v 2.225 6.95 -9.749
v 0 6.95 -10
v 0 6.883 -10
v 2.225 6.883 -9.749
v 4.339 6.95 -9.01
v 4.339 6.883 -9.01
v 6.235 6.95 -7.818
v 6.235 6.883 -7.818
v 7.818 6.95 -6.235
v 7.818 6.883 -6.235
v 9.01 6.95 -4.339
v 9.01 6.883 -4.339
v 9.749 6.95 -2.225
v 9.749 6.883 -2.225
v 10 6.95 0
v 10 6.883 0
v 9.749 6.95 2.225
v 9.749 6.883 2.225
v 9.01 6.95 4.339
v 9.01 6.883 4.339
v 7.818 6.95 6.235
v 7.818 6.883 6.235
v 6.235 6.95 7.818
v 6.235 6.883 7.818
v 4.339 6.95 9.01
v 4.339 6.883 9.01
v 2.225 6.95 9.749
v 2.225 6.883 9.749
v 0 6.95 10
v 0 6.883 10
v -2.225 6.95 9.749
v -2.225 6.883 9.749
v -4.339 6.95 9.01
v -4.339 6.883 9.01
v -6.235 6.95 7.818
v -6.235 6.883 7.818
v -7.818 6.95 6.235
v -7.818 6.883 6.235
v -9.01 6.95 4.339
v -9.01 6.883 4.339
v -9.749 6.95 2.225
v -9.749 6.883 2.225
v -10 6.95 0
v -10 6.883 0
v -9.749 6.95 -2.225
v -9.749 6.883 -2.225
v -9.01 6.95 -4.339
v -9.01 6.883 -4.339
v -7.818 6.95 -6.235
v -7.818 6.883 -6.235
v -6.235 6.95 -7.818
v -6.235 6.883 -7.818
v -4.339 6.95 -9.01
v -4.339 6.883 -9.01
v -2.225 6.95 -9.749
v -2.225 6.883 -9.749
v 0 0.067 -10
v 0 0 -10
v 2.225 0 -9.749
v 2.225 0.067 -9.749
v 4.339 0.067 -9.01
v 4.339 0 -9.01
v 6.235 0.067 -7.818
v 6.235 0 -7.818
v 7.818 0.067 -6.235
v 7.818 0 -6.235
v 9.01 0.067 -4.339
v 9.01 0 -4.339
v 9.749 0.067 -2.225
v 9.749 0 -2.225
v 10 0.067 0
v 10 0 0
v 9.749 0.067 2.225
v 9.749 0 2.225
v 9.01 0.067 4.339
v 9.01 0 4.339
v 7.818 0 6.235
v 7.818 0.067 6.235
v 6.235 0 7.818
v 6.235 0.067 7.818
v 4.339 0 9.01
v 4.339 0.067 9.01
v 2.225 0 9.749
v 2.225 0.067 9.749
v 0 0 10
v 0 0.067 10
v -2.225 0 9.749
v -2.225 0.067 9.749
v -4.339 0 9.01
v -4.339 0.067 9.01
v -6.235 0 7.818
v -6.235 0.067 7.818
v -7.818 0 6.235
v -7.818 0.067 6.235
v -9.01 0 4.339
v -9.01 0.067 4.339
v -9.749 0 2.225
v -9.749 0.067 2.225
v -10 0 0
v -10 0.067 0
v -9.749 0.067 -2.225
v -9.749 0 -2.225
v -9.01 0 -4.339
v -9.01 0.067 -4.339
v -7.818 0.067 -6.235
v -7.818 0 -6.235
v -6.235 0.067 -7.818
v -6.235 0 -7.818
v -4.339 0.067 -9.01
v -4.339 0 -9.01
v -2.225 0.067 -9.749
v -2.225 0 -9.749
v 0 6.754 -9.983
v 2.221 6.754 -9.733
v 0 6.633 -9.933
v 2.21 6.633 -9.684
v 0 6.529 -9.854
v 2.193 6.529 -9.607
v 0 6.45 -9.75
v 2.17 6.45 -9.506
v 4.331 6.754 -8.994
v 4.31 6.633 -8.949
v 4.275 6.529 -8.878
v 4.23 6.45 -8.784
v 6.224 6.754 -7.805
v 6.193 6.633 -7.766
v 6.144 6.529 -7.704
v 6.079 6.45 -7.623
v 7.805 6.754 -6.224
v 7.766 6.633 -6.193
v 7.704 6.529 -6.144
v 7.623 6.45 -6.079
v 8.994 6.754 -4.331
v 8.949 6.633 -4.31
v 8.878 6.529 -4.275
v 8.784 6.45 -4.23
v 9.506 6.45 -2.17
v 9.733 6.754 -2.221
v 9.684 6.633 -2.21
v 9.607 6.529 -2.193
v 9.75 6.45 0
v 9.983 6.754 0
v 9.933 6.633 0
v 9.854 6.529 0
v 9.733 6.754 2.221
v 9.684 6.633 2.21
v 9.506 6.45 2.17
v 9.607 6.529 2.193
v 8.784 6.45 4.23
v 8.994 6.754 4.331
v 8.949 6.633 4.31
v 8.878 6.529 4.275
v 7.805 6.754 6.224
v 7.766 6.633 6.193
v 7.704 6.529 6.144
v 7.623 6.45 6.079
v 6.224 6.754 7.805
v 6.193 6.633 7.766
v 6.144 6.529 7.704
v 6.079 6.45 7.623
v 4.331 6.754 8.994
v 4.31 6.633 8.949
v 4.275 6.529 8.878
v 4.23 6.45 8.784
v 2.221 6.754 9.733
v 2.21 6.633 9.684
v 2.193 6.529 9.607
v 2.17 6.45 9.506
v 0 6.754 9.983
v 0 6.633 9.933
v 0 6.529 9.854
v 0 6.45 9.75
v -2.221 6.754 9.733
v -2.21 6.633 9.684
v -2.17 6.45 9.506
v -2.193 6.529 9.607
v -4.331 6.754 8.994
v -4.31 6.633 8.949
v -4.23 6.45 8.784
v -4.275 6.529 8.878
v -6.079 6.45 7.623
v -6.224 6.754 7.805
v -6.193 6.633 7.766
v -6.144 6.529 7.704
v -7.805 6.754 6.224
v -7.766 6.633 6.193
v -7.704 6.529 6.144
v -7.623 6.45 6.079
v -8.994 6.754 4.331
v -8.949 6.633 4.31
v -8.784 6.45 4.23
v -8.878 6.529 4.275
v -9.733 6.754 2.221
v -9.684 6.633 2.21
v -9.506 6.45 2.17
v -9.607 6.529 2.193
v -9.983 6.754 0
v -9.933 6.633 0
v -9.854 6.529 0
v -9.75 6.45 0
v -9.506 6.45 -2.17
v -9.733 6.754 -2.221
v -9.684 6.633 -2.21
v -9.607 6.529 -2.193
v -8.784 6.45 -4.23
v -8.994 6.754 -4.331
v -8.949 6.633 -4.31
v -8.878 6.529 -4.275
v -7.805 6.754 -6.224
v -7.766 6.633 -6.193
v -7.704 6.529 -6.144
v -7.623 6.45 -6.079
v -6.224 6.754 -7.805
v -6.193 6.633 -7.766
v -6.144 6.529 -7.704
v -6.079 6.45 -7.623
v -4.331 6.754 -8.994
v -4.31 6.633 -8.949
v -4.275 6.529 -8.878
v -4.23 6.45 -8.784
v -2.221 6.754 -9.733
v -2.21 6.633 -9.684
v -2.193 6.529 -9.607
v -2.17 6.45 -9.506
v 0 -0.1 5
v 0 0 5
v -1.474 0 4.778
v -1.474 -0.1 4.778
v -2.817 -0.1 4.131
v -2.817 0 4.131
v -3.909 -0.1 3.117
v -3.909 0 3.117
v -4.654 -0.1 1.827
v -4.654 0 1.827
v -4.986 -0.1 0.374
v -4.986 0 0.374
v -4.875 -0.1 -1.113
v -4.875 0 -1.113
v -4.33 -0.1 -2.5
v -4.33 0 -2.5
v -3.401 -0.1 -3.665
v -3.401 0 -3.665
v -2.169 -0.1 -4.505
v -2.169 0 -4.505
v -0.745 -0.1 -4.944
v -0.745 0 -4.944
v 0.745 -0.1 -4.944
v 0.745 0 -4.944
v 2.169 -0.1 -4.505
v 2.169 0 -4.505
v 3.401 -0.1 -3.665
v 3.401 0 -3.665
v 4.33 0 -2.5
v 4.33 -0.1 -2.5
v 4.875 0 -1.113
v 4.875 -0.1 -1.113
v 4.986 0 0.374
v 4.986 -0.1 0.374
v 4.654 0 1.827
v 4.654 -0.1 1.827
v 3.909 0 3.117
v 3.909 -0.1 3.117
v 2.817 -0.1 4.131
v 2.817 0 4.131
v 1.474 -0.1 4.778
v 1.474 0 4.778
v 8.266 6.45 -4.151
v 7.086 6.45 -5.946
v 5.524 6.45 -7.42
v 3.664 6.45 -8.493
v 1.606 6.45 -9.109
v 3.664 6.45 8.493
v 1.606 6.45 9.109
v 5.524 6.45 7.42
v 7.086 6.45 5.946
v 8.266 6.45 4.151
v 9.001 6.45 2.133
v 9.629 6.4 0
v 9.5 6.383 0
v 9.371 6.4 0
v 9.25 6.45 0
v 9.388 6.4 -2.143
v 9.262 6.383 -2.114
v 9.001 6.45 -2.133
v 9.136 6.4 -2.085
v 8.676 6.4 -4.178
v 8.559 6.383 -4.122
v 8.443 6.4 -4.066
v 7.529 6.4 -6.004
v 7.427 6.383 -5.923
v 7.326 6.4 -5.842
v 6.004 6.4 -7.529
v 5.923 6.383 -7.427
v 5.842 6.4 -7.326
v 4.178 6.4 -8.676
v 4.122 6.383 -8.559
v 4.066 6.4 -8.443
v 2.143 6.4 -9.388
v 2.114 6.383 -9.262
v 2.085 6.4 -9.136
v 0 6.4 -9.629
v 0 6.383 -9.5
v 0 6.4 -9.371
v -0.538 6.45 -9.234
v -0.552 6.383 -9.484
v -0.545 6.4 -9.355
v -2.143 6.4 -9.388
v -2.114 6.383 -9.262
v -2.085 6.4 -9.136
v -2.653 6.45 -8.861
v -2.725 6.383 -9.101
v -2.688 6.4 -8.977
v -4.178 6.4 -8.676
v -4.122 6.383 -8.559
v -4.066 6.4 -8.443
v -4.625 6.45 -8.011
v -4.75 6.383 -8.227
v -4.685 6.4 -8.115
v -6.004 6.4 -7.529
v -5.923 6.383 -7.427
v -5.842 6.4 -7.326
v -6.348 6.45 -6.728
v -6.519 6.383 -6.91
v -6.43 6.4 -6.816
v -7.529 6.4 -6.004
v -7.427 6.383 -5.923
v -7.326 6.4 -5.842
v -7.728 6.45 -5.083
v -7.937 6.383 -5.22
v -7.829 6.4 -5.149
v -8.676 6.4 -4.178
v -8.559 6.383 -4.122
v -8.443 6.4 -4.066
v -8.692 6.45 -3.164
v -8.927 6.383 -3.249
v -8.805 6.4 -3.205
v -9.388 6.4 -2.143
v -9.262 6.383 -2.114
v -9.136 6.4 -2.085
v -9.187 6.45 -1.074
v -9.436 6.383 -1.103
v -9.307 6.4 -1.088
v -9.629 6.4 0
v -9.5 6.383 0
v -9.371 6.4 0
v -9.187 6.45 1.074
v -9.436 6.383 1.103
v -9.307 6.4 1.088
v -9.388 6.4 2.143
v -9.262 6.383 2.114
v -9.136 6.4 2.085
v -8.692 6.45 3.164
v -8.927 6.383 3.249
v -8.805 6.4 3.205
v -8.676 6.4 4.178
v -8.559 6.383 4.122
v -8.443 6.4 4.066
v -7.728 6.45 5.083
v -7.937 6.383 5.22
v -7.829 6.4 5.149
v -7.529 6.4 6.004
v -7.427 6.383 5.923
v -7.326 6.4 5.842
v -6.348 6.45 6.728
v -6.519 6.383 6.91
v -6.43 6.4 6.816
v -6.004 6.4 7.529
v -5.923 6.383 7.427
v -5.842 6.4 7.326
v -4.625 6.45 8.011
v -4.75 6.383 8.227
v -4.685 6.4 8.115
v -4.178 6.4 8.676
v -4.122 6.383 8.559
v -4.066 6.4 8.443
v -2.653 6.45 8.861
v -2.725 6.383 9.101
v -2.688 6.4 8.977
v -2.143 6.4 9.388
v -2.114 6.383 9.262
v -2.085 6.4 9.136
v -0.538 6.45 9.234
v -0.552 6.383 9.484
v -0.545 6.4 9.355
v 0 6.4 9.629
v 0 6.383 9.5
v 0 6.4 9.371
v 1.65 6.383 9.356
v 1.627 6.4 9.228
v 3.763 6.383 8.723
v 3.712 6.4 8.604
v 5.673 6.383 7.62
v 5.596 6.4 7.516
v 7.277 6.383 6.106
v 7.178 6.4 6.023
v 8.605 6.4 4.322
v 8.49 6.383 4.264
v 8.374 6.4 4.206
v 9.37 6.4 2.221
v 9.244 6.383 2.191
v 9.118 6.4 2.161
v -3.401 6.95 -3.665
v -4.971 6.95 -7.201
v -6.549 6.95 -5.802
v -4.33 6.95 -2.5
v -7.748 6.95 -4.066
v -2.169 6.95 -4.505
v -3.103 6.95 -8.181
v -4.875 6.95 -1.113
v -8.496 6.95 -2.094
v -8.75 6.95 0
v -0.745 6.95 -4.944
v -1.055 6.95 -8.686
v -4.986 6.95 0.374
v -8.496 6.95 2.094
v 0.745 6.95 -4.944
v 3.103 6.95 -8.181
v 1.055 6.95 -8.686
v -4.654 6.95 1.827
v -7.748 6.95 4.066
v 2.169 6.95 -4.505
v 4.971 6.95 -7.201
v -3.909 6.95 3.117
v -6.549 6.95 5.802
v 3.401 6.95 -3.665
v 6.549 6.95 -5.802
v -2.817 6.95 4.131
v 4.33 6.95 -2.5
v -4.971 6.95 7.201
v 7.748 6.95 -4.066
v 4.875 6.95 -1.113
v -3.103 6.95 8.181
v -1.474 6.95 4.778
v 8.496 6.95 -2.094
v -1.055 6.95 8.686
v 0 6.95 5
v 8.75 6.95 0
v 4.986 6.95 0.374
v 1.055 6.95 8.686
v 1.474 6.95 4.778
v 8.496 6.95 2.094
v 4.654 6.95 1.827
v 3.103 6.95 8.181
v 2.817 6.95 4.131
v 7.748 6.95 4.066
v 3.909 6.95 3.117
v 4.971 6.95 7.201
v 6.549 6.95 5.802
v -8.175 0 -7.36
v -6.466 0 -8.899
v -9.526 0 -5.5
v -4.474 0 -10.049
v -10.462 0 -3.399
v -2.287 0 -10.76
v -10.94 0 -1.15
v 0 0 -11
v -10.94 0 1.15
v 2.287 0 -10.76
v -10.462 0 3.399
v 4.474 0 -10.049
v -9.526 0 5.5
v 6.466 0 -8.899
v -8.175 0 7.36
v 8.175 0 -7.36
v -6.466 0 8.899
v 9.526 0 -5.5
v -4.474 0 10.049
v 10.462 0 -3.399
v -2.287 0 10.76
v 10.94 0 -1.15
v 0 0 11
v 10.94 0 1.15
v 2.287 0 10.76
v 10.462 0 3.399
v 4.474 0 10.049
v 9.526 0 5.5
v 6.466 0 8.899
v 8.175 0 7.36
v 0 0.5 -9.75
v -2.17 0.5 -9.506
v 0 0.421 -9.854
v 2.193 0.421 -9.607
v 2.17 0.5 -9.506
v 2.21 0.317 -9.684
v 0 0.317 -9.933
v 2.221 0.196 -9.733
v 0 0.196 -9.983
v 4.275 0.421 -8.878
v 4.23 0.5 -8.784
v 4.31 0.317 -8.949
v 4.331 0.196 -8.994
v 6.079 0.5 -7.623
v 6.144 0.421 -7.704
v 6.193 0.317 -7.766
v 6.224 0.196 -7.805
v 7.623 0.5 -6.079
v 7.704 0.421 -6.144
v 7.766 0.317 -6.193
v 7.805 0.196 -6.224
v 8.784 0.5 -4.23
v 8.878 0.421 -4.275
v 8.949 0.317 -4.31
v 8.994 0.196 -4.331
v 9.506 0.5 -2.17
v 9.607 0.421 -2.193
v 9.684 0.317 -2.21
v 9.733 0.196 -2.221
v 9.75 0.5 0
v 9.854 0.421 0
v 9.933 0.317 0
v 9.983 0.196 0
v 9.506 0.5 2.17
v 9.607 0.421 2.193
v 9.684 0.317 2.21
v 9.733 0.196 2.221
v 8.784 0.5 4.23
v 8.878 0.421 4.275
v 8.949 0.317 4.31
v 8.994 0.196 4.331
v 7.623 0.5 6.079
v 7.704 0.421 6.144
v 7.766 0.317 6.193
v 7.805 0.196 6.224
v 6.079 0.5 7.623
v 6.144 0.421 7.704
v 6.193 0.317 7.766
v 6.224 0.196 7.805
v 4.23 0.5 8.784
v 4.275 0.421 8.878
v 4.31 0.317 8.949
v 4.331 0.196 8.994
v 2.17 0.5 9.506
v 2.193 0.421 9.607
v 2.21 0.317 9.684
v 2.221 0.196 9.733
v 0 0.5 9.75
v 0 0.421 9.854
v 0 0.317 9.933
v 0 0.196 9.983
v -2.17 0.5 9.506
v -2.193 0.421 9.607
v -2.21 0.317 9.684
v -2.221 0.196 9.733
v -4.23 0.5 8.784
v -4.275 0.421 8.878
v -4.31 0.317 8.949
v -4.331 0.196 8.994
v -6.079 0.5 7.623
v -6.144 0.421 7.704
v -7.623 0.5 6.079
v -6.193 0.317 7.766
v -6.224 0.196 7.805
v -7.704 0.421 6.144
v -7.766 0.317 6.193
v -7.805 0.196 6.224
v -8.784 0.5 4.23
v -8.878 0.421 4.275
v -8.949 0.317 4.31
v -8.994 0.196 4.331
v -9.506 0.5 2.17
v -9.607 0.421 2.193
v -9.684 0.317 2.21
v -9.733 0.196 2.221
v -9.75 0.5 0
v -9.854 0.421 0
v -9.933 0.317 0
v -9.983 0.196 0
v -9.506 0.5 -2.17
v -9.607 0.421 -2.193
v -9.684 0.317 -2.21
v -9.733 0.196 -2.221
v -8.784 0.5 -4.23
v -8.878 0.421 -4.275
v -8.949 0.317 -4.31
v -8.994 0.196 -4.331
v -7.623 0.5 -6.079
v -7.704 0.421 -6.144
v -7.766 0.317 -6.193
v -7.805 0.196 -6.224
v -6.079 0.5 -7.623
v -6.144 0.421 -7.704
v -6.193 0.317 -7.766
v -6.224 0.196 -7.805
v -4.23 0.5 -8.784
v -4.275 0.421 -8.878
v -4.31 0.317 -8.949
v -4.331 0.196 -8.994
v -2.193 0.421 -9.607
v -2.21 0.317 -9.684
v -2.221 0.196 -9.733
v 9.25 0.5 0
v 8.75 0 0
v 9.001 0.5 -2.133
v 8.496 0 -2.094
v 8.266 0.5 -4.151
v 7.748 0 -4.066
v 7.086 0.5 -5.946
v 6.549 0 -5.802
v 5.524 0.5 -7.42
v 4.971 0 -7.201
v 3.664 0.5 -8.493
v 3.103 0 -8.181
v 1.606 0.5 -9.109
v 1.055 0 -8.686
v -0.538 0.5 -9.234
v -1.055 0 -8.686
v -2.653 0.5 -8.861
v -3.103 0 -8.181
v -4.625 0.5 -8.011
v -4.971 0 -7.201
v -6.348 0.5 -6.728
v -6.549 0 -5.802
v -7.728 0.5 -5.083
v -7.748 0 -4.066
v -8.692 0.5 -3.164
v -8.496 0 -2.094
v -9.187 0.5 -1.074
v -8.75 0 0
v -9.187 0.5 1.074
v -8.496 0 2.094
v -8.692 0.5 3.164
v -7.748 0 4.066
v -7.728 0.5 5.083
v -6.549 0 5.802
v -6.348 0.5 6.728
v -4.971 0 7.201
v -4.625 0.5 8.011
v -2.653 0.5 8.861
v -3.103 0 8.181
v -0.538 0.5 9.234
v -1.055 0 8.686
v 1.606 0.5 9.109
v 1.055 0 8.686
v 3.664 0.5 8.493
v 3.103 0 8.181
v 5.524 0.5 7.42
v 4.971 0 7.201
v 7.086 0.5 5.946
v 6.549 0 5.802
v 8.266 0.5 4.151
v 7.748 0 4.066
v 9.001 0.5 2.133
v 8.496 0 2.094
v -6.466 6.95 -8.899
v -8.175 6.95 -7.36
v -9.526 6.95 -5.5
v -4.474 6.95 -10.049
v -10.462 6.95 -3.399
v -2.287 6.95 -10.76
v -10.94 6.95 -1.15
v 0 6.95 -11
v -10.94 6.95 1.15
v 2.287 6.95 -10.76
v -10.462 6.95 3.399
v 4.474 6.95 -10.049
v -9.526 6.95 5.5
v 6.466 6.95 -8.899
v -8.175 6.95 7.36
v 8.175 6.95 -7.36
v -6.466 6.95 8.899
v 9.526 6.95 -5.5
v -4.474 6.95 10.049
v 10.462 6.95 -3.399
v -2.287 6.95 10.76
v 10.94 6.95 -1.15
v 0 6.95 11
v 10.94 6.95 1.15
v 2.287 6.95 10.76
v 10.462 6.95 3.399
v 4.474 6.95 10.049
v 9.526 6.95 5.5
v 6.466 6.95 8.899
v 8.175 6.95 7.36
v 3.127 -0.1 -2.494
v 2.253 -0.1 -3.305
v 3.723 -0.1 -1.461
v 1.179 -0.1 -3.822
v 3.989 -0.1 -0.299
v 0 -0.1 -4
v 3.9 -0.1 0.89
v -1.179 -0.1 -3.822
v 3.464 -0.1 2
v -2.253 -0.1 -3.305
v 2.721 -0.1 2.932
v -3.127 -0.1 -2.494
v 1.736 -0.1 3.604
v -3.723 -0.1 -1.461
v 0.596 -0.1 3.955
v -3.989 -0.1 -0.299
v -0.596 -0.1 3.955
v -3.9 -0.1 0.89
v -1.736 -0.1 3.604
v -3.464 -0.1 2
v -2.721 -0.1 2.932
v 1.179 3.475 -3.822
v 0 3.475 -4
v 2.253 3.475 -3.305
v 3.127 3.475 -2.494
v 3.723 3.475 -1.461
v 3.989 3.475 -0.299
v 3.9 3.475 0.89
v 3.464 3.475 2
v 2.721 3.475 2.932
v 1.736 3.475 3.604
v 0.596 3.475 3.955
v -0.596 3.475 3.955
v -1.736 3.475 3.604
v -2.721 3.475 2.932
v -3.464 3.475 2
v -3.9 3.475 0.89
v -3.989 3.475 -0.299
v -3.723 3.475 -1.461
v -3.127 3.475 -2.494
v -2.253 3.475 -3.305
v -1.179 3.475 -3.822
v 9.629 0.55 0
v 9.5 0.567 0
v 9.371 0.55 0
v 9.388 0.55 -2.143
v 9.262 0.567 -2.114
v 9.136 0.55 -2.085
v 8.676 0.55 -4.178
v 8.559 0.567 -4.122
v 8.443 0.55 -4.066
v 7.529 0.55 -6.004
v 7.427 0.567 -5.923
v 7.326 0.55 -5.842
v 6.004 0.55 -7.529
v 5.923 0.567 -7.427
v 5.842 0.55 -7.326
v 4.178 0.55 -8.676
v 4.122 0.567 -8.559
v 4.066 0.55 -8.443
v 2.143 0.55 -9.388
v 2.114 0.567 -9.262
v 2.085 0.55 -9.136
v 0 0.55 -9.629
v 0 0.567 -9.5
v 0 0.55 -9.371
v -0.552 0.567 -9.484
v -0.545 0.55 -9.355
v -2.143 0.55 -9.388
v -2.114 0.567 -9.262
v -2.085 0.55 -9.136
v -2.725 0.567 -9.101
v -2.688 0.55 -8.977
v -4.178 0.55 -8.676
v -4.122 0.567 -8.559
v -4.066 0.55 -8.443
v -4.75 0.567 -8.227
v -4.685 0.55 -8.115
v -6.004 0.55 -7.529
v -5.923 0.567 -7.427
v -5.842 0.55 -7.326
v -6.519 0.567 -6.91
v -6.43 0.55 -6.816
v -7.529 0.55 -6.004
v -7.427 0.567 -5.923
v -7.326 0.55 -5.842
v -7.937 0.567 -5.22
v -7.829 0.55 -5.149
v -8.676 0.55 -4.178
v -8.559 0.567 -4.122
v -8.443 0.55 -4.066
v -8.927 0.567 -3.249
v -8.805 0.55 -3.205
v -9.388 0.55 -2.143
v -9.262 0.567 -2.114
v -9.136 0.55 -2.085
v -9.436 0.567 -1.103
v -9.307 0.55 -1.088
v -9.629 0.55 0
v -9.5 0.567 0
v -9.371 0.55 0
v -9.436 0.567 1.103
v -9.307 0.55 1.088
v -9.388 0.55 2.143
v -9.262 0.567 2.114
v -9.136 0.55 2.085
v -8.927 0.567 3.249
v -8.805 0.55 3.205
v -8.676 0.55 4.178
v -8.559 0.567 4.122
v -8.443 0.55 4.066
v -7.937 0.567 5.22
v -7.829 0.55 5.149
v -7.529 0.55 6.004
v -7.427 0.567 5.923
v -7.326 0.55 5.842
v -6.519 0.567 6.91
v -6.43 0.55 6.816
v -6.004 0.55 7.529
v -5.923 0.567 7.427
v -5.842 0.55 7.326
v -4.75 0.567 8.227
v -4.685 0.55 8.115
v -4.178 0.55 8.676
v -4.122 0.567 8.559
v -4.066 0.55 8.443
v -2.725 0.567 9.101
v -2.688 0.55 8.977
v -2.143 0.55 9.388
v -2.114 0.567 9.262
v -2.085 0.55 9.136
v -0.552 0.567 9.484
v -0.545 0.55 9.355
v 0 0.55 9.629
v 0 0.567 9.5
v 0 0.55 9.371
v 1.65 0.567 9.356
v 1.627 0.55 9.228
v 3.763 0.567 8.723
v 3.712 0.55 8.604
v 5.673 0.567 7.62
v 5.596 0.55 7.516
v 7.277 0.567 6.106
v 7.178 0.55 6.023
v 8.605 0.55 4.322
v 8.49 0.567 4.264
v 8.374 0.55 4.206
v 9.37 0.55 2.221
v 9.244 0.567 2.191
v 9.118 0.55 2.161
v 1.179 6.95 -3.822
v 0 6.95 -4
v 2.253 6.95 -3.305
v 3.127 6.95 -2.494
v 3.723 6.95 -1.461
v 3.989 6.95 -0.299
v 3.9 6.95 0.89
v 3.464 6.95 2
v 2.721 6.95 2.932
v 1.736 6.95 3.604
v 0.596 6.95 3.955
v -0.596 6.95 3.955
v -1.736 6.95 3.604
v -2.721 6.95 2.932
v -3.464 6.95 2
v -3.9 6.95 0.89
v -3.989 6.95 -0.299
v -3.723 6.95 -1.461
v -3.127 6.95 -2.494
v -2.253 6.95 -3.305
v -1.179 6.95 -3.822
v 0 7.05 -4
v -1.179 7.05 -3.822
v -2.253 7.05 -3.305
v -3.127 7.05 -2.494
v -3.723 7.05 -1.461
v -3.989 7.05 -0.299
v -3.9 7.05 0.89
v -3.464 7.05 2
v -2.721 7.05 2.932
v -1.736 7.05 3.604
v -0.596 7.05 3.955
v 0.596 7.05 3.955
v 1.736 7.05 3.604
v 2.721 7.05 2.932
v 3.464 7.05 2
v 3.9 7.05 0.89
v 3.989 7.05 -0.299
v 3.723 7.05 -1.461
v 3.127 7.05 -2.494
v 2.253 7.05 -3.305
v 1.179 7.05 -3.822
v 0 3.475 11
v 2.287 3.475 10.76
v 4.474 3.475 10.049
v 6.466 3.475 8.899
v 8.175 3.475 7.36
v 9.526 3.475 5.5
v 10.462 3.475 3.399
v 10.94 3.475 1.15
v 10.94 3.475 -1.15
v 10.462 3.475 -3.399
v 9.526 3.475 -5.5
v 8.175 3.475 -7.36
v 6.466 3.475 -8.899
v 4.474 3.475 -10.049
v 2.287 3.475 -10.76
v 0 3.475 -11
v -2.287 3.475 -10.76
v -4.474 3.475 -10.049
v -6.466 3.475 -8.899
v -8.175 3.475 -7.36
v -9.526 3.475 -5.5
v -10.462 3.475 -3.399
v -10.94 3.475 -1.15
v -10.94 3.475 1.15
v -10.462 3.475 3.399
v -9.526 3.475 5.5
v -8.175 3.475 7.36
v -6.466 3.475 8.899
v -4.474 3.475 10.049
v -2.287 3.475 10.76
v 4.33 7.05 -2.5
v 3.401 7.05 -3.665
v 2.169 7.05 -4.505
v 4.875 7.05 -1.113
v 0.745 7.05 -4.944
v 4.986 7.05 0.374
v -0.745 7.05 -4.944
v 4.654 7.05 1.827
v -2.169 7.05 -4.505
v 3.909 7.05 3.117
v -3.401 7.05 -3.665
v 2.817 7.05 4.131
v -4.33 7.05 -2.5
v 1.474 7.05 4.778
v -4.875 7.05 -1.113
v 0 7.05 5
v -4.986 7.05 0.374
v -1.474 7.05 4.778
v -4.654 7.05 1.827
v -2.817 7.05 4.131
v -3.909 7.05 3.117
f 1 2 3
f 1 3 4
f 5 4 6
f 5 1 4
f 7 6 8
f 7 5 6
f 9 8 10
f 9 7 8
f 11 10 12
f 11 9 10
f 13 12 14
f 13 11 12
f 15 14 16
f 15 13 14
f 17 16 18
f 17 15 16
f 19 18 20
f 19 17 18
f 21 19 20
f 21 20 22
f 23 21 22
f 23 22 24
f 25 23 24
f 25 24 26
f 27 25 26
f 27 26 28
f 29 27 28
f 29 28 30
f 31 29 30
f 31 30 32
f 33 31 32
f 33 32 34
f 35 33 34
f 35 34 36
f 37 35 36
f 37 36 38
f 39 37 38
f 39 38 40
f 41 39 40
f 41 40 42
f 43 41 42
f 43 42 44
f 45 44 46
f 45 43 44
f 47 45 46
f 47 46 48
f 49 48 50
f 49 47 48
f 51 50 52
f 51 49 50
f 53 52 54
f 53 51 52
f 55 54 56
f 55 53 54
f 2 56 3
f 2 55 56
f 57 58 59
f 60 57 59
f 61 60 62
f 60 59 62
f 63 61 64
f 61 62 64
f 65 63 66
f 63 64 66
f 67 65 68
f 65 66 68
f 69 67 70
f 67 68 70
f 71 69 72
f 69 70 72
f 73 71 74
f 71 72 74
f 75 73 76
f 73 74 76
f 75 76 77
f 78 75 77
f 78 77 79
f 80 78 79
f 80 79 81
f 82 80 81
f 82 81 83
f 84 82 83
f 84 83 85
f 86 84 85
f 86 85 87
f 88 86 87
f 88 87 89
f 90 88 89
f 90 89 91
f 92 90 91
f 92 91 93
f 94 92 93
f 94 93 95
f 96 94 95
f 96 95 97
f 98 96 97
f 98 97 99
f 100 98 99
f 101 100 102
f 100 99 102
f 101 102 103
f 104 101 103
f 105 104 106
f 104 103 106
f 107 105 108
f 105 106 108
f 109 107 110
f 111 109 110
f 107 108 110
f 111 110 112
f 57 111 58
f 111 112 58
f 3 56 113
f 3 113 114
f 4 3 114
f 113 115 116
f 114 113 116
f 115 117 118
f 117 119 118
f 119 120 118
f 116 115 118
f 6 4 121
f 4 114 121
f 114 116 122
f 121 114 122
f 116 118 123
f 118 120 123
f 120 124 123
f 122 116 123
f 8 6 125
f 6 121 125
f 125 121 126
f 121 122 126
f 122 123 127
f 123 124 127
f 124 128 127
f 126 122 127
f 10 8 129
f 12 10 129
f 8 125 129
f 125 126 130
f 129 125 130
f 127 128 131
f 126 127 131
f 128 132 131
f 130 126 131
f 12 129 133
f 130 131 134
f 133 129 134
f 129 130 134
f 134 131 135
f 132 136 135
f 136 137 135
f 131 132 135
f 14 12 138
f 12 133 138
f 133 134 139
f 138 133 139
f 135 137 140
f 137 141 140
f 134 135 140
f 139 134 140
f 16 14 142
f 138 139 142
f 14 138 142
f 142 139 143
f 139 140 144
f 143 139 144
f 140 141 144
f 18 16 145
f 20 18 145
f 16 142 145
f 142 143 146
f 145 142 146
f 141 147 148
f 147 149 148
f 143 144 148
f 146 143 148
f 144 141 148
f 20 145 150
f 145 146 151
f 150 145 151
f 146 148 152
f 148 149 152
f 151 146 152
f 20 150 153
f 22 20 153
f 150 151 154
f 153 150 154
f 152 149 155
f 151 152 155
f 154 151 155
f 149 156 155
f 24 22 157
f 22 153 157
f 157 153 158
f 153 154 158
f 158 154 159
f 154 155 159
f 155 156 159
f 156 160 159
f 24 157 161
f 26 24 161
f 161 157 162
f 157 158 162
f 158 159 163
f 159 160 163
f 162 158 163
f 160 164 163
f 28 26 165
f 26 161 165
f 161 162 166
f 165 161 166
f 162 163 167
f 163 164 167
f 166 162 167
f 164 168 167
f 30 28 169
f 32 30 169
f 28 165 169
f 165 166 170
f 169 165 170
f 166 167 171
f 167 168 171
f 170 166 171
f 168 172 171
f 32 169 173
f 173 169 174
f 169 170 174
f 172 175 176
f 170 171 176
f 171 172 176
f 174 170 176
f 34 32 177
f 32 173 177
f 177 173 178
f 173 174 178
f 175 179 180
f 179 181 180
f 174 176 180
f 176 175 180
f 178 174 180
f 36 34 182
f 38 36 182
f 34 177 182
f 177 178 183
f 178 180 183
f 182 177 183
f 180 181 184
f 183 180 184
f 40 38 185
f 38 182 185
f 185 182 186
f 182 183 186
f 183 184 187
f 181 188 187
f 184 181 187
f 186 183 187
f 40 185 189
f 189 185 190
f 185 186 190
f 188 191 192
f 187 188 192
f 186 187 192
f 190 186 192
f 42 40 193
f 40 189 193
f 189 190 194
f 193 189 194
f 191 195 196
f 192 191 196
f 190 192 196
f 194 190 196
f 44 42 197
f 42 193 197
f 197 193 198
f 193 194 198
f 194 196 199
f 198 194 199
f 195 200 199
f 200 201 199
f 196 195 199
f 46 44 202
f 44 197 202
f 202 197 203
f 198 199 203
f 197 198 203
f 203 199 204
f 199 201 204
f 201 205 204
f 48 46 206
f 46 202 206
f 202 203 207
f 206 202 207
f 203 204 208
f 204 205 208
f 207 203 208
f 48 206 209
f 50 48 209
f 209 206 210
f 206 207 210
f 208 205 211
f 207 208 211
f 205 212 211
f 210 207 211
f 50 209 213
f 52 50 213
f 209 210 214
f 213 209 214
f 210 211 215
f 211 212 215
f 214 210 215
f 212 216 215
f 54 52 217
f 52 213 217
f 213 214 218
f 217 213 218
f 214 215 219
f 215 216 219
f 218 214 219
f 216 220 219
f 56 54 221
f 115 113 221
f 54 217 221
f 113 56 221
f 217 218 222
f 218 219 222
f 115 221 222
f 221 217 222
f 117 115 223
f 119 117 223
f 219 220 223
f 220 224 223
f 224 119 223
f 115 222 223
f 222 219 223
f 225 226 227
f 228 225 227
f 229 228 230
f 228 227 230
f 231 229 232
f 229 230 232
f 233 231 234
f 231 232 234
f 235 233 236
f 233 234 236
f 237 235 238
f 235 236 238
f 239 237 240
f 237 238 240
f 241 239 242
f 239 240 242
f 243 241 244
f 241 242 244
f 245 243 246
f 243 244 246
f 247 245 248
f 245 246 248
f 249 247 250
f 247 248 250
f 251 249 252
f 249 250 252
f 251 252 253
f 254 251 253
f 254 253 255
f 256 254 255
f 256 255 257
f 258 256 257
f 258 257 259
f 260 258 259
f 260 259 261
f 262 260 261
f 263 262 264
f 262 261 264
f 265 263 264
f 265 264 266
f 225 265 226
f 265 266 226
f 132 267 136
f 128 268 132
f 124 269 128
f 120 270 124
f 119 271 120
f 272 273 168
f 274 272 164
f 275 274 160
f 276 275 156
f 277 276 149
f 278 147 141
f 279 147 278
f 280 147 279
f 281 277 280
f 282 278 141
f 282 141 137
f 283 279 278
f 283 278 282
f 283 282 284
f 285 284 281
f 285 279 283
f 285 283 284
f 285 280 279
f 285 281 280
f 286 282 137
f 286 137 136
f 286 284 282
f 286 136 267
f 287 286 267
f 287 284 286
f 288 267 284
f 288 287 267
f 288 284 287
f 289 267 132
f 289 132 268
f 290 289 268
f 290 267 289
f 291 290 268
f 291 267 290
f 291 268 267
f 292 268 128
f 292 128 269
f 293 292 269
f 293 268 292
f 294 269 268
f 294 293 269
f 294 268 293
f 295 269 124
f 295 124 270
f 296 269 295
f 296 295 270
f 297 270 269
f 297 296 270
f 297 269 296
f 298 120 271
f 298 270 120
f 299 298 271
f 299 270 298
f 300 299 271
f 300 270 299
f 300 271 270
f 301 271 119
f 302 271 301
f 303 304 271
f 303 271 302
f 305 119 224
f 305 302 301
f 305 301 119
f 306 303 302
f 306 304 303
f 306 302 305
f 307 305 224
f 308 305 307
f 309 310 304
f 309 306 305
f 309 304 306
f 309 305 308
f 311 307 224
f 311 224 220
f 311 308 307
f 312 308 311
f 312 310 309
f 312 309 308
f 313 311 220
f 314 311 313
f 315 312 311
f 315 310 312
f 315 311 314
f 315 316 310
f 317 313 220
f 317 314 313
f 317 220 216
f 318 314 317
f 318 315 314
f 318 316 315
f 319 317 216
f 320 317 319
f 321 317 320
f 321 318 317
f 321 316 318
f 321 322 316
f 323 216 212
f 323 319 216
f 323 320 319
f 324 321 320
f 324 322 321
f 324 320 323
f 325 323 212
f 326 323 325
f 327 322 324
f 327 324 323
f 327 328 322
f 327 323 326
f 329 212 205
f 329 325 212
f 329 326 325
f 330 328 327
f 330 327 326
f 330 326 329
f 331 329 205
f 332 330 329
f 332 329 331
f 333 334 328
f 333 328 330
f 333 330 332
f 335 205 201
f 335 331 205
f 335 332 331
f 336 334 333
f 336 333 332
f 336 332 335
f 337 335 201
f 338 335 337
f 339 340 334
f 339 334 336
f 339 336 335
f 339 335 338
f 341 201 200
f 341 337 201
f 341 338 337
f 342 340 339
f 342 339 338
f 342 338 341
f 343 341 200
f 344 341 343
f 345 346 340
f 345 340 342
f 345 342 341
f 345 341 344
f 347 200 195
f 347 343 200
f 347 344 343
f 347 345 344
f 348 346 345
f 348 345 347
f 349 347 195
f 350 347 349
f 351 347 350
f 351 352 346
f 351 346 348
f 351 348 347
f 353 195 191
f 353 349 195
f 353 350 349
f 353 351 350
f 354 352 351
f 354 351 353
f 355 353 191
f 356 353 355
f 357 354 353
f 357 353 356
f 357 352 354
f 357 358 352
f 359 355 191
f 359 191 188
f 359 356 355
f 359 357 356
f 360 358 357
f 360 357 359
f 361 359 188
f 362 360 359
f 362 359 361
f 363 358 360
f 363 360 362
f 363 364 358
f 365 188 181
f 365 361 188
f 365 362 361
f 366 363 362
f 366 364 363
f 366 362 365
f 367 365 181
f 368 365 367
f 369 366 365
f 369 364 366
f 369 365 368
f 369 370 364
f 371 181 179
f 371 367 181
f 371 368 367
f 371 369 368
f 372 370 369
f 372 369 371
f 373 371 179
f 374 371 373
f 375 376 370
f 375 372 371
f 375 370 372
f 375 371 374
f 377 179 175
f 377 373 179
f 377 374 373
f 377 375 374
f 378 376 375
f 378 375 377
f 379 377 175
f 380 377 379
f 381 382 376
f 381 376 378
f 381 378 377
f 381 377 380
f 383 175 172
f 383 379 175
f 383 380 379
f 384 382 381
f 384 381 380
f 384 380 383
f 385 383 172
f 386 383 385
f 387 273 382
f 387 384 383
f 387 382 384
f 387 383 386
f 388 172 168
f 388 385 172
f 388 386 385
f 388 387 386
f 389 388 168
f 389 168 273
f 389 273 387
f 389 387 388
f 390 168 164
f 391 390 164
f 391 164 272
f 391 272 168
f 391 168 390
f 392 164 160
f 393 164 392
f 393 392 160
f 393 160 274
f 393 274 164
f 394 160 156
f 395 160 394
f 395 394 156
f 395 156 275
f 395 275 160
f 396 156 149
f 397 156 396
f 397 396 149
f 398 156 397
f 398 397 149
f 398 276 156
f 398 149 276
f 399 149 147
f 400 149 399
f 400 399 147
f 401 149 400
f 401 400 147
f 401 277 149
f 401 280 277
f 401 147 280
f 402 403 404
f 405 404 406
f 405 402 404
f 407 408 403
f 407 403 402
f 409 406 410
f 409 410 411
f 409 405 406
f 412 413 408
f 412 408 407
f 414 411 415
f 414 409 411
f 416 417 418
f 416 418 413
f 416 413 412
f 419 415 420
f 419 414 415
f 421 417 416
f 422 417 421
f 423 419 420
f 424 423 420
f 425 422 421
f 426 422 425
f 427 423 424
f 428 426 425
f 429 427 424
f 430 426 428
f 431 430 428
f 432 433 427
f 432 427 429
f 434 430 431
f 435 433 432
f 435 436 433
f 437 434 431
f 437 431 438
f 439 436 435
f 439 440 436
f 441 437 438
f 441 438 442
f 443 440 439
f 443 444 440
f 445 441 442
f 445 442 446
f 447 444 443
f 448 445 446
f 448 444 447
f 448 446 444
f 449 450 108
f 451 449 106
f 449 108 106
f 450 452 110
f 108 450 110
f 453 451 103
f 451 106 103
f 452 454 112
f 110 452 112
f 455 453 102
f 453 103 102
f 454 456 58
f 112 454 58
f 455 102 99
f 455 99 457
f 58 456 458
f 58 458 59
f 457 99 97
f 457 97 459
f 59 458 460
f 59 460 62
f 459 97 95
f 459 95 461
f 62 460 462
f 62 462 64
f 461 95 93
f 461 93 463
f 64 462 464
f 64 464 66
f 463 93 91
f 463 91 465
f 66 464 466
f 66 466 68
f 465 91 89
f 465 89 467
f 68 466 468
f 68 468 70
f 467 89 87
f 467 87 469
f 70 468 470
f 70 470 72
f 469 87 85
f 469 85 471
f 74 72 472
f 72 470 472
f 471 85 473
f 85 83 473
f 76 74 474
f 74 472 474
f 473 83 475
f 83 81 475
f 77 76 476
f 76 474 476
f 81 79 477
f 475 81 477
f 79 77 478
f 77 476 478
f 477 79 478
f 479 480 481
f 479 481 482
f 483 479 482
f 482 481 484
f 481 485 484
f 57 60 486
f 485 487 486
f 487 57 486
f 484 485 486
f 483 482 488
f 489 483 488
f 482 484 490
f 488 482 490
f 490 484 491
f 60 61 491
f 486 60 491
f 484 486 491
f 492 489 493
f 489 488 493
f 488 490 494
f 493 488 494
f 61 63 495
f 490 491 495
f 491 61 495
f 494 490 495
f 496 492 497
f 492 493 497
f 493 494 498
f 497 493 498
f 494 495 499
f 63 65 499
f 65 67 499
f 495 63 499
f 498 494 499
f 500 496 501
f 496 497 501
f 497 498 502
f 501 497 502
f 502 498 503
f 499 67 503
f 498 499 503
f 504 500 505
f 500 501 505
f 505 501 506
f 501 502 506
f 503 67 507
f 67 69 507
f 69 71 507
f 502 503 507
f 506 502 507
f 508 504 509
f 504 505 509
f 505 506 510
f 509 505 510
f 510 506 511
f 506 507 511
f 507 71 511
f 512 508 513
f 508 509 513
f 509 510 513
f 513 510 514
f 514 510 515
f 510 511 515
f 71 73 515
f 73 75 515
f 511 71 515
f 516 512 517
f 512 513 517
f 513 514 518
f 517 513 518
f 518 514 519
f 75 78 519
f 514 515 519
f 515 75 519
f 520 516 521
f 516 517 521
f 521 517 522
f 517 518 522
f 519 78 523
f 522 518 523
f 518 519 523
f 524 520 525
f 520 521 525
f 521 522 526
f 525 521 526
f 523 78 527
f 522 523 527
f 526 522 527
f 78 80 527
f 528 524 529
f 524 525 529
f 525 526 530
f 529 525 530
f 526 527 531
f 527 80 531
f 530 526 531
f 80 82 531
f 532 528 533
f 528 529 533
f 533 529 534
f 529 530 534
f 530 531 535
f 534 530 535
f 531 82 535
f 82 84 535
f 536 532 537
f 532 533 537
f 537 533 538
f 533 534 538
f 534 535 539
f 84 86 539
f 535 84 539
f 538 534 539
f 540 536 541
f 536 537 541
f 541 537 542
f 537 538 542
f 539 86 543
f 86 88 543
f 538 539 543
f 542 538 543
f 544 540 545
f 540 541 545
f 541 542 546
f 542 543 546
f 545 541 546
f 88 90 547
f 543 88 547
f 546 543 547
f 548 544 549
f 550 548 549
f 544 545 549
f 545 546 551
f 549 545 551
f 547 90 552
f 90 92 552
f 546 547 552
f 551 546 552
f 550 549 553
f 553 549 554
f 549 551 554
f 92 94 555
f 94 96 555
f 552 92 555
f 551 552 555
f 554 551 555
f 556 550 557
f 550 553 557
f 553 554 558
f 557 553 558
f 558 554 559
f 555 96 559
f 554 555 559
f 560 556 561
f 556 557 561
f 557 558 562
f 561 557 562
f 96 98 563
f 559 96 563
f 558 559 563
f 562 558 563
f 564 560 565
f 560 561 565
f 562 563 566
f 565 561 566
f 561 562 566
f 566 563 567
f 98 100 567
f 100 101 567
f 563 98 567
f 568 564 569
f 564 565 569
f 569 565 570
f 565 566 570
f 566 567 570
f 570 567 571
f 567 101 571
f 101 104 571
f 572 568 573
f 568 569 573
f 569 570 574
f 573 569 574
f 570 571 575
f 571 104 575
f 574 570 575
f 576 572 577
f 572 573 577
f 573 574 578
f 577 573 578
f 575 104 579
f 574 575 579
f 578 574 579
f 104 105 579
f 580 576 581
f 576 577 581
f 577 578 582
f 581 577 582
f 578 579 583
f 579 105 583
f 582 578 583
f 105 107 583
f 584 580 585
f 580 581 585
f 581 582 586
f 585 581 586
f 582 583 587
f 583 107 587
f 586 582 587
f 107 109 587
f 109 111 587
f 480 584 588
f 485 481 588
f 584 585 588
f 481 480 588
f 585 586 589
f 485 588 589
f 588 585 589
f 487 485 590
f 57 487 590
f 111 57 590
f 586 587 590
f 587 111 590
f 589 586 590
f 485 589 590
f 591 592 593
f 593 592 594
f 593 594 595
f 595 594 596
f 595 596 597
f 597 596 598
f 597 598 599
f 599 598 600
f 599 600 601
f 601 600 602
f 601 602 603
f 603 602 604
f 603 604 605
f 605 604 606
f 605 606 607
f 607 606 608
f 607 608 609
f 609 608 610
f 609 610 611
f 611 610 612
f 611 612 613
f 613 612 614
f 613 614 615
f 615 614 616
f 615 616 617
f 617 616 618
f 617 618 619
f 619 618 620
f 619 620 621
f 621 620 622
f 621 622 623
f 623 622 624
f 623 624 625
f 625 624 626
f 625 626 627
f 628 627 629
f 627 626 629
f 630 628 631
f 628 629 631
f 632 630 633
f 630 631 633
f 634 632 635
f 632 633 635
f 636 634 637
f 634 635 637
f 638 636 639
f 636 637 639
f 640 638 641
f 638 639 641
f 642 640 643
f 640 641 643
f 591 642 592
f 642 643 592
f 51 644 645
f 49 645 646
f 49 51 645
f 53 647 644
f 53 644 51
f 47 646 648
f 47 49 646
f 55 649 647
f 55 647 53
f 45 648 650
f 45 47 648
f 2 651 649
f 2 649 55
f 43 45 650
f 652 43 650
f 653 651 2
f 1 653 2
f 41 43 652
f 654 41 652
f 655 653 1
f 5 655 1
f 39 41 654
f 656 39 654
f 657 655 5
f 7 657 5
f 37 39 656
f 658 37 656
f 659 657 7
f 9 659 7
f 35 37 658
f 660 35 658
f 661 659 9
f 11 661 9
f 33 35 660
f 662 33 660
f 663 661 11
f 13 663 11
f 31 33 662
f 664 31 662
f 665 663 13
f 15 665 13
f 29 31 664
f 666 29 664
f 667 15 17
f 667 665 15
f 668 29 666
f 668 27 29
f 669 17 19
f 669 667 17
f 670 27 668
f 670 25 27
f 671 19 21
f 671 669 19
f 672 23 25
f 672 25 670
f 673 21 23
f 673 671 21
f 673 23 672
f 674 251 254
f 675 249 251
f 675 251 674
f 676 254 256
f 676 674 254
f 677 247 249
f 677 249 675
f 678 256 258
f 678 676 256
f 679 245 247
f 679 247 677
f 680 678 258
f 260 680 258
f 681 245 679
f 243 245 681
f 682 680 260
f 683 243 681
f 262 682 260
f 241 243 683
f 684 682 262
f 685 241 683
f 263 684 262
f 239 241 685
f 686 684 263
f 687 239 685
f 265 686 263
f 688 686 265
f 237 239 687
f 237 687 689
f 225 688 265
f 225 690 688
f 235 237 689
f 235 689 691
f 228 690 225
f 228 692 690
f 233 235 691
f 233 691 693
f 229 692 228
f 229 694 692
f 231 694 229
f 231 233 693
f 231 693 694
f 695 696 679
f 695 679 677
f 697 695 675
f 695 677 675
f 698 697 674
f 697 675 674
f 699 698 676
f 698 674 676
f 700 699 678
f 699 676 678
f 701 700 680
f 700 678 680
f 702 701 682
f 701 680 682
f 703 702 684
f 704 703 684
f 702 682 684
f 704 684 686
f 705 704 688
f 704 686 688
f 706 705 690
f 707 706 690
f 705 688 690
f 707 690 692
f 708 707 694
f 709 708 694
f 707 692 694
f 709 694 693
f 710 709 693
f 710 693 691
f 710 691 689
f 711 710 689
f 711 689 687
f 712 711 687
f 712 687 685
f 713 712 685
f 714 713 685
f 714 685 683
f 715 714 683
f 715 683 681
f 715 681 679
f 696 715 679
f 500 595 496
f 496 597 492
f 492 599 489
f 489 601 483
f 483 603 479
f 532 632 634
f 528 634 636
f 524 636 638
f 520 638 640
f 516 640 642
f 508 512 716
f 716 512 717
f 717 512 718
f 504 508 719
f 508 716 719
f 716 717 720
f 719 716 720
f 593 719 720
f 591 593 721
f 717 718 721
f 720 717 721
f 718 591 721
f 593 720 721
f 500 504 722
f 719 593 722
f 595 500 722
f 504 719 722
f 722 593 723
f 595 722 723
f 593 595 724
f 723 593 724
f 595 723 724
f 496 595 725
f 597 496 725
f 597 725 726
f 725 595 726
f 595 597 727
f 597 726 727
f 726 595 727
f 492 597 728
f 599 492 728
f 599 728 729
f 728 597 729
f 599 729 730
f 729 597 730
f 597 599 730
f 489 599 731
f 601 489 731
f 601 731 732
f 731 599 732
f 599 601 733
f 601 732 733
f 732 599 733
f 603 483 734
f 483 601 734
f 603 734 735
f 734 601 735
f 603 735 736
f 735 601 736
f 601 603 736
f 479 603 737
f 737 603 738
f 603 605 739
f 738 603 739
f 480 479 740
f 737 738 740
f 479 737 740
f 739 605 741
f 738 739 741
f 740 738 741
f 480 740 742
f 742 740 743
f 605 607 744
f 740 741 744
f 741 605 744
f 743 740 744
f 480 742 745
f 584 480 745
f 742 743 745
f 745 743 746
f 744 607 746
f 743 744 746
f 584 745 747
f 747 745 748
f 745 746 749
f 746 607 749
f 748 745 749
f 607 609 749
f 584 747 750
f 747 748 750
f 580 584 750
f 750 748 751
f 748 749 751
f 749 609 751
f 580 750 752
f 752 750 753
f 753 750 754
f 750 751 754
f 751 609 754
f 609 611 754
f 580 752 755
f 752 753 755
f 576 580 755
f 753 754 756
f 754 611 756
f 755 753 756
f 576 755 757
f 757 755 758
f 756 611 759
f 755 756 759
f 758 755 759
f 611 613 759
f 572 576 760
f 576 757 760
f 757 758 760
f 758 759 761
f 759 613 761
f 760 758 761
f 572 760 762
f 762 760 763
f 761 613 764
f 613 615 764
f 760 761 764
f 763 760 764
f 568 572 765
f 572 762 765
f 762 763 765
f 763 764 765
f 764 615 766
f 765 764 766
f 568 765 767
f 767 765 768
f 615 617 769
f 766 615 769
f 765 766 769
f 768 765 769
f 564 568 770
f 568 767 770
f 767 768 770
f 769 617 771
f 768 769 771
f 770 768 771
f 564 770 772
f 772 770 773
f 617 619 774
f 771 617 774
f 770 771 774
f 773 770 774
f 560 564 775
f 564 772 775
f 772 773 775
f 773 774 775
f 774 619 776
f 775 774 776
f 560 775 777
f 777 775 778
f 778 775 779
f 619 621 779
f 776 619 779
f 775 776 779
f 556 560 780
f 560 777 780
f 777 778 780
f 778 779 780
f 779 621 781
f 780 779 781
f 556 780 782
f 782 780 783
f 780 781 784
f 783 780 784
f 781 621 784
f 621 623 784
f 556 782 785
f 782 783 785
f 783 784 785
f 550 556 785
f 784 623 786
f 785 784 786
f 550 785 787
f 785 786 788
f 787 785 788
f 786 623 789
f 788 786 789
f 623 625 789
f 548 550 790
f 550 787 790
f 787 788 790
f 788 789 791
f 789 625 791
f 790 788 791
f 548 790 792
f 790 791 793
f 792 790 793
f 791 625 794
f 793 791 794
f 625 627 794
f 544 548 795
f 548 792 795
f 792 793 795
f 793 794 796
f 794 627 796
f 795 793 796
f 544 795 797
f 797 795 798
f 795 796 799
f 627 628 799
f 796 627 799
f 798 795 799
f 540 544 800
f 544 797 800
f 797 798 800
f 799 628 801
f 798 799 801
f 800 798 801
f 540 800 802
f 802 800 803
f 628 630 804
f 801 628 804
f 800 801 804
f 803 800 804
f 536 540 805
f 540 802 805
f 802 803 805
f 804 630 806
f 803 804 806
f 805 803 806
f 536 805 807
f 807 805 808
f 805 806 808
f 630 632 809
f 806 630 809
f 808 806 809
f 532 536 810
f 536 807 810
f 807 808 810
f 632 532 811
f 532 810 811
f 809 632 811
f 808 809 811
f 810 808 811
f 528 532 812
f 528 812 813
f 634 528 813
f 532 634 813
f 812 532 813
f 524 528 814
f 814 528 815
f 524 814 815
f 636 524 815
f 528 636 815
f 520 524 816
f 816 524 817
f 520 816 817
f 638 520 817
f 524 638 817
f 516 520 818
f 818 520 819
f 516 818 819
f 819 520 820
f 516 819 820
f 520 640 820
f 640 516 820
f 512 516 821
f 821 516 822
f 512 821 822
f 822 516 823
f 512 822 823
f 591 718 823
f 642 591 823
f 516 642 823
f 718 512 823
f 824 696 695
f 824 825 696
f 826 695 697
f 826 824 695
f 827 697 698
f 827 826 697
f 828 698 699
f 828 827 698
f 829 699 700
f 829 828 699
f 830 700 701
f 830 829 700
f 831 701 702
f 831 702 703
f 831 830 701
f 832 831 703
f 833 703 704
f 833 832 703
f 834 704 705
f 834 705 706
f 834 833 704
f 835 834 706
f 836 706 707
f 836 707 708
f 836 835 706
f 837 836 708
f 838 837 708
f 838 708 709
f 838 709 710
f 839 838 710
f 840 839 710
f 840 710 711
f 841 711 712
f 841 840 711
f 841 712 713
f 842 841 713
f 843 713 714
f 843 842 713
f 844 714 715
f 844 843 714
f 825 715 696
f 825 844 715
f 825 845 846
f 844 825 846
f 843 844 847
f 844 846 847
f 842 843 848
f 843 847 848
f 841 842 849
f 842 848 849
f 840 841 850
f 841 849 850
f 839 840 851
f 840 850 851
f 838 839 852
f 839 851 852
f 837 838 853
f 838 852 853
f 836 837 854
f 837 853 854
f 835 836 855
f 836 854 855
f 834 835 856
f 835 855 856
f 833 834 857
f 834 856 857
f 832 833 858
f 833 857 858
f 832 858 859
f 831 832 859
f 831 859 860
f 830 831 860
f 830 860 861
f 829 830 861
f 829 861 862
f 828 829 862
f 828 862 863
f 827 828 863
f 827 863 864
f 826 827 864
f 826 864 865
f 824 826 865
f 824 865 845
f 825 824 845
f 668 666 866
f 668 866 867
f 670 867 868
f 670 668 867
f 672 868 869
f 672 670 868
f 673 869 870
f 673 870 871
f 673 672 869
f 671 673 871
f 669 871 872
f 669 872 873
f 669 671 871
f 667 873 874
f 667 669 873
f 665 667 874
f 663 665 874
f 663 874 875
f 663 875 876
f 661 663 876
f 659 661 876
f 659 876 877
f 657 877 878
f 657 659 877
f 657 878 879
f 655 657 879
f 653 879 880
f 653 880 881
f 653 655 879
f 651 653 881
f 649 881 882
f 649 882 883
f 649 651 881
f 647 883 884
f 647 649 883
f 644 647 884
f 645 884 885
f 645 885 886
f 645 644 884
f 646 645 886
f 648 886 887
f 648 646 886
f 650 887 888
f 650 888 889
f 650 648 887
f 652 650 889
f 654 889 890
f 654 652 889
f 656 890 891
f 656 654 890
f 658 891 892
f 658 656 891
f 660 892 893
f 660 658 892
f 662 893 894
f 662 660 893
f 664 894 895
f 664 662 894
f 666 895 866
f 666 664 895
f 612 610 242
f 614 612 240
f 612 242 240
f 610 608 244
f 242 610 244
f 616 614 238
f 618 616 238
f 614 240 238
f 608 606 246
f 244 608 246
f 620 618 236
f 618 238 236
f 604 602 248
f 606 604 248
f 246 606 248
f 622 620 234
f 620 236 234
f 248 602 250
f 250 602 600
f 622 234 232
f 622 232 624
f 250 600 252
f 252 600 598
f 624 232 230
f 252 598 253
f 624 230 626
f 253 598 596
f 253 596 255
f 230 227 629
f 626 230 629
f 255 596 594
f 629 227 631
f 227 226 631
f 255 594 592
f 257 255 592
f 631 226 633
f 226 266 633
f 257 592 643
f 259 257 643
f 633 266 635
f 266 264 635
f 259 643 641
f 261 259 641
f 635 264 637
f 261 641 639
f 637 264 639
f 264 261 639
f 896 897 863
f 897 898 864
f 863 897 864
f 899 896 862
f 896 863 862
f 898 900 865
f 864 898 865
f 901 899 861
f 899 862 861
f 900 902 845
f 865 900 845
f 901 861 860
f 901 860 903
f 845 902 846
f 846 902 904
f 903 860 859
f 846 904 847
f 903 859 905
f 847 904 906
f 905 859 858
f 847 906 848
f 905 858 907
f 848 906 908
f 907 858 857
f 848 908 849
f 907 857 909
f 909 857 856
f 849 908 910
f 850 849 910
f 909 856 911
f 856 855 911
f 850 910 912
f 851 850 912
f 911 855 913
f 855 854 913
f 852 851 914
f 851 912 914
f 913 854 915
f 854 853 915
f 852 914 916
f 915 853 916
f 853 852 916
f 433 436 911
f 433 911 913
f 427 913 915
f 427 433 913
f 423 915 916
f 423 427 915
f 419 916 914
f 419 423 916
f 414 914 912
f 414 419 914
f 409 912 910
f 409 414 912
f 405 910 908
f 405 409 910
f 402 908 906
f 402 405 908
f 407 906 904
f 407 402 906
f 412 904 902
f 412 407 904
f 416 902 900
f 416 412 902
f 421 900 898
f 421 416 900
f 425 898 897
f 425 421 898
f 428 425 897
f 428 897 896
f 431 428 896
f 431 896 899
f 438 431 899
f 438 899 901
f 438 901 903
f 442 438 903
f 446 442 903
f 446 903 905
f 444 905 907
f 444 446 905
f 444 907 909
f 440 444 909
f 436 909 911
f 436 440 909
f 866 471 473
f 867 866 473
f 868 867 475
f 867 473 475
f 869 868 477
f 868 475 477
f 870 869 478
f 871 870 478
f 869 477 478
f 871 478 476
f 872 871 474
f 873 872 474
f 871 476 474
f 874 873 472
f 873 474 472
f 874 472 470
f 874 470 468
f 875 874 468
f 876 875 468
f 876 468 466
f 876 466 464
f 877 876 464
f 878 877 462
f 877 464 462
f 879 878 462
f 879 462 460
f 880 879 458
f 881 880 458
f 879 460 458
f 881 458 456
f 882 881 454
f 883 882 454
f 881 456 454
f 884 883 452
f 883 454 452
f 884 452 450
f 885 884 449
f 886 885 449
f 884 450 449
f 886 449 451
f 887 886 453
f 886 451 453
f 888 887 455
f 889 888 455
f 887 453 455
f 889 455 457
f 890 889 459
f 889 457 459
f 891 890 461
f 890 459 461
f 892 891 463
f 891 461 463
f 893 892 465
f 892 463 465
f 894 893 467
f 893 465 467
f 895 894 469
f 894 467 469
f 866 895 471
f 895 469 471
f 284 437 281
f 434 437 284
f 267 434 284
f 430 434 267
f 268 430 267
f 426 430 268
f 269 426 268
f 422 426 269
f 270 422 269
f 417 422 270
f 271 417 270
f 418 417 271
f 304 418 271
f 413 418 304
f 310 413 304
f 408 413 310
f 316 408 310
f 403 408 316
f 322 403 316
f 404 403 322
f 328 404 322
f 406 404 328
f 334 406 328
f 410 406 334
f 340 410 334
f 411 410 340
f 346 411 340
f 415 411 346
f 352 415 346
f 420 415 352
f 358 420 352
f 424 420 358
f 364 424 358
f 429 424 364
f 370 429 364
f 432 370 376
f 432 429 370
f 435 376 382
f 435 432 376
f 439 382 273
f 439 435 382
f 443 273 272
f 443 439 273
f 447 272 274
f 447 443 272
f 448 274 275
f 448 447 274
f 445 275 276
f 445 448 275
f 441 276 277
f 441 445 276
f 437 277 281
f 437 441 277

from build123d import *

# Parameters (mm, degrees)
SKETCH_1_R             = 11
EXTRUDE_1_DEPTH        = 3.475
SKETCH_3_R             = 10
SKETCH_3_R_2           = 9.75
CUT_EXTRUDE_2_DEPTH    = 0.5
FILLET_4_R             = 0.5
SKETCH_7_R             = 4
CUT_EXTRUDE_3_DEPTH    = 16.939749841
SKETCH_15_R            = 5
EXTRUDE_7_DEPTH        = 0.1
SKETCH_18_R            = 4
CUT_EXTRUDE_4_DEPTH    = 16.961849047
FILLET_4_OF_MIRROR_3_R = 0.5
SKETCH_19_R            = 4
CUT_EXTRUDE_5_DEPTH    = 18.120820658


with BuildPart() as part:
    # Эскиз1 → Бобышка-Вытянуть1 (new body)
    with BuildSketch(Plane(origin=(0, 0, 0), x_dir=(1, 0, 0), z_dir=(0, 1, 0))):
        with Locations(Location((0, 0, 0), (0, 0, 270))):
            Circle(SKETCH_1_R)
    extrude_1 = extrude(amount=EXTRUDE_1_DEPTH)

    # Эскиз3 → Вырез-Вытянуть2 (cut)
    with BuildSketch(Plane.XZ):
        with Locations(Location((0, 0, 0), (0, 0, 270))):
            Circle(SKETCH_3_R)
        with Locations(Location((0, 0, 0), (0, 0, 270))):
            Circle(SKETCH_3_R_2, mode=Mode.SUBTRACT)
    cut_extrude_2 = extrude(amount=-CUT_EXTRUDE_2_DEPTH, mode=Mode.SUBTRACT)

    # Скругление4
    # the kernel refuses this fillet: 0.5 mm, written as the material it adds along each edge
    with BuildSketch(Plane(origin=(0, 0.5, 0), x_dir=(0, 0, -1), z_dir=(-1, 0, 0))) as fillet_4_piece_1:
        with BuildLine():
            CenterArc((9.5, 0.433012702), FILLET_4_R, 300, 60)
            Line((9.75, 0), (9.755, -0.008660254))
            ThreePointArc((9.755, -0.008660254), (9.875, -0.01), (10, -0.01))
            Line((10, -0.01), (10.01, 0))
            Line((10.01, 0), (10.01, 0.433012702))
            Line((10.01, 0.433012702), (10, 0.433012702))
        make_face()
    revolve(axis=Axis((0, 0.5, 0), (0, -1, 0)))

    # Фаска1: read off the stored shape, not the designer's step
    # Фаска1 outline → Фаска1 (revolve, cut)
    with BuildSketch(Plane.XY):
        with BuildLine():
            Line((9.25, 0.5), (8.75, 0))
            Line((8.75, 0), (9.75, 0))
            Line((9.75, 0), (9.75, 0.5))
            ThreePointArc((9.75, 0.5), (9.5, 0.566987298), (9.25, 0.5))
        make_face()
    chamfer_1 = revolve(axis=Axis((0, 0, 0), (0, 1, 0)), mode=Mode.SUBTRACT)

    # Эскиз7 → Вырез-Вытянуть3 (cut, symmetric)
    with BuildSketch(Plane.XZ):
        with Locations(Location((0, 0, 0), (0, 0, 270))):
            Circle(SKETCH_7_R)
    cut_extrude_3 = extrude(amount=CUT_EXTRUDE_3_DEPTH, both=True, mode=Mode.SUBTRACT)

    # Эскиз15 → Бобышка-Вытянуть7 (add)
    with BuildSketch(Plane.XZ):
        with Locations(Location((0, 0, 0), (0, 0, 90))):
            Circle(SKETCH_15_R)
    extrude_7 = extrude(amount=EXTRUDE_7_DEPTH)

    # Эскиз18 → Вырез-Вытянуть4 (cut, through all)
    with BuildSketch(Plane.XZ.offset(0.1)):
        with Locations(Location((0, 0, 0), (0, 0, 270))):
            Circle(SKETCH_18_R)
    extrude(amount=-CUT_EXTRUDE_4_DEPTH, mode=Mode.SUBTRACT)

    # Зеркальное отражение3: Бобышка-Вытянуть1, Вырез-Вытянуть2, Фаска1, Вырез-Вытянуть3, Бобышка-Вытянуть7 across plane
    add(extrude_1.mirror(Plane.ZX.offset(3.475)))
    add(cut_extrude_2.mirror(Plane.ZX.offset(3.475)), mode=Mode.SUBTRACT)
    add(chamfer_1.mirror(Plane.ZX.offset(3.475)), mode=Mode.SUBTRACT)
    add(cut_extrude_3.mirror(Plane.ZX.offset(3.475)), mode=Mode.SUBTRACT)
    add(extrude_7.mirror(Plane.ZX.offset(3.475)))

    # Скругление4 of Зеркальное отражение3
    # the kernel refuses this fillet: 0.5 mm, written as the material it adds along each edge
    with BuildSketch(Plane(origin=(0, 6.45, 0), x_dir=(0, 0, -1), z_dir=(-1, 0, 0))) as fillet_4_of_mirror_3_piece_1:
        with BuildLine():
            CenterArc((9.5, -0.433012702), FILLET_4_OF_MIRROR_3_R, 0, 60)
            Line((9.75, 0), (9.755, 0.008660254))
            ThreePointArc((9.755, 0.008660254), (9.875, 0.01), (10, 0.01))
            Line((10, 0.01), (10.01, 0))
            Line((10.01, 0), (10.01, -0.433012702))
            Line((10.01, -0.433012702), (10, -0.433012702))
        make_face()
    revolve(axis=Axis((0, 6.45, 0), (0, -1, 0)))

    # Эскиз19 → Вырез-Вытянуть5 (cut, through all)
    with BuildSketch(Plane(origin=(0, 7.05, 0), x_dir=(1, 0, 0), z_dir=(0, 1, 0))):
        with Locations(Location((0, 0, 0), (0, 0, 90))):
            Circle(SKETCH_19_R)
    extrude(amount=-CUT_EXTRUDE_5_DEPTH, mode=Mode.SUBTRACT)


solid = part.part
